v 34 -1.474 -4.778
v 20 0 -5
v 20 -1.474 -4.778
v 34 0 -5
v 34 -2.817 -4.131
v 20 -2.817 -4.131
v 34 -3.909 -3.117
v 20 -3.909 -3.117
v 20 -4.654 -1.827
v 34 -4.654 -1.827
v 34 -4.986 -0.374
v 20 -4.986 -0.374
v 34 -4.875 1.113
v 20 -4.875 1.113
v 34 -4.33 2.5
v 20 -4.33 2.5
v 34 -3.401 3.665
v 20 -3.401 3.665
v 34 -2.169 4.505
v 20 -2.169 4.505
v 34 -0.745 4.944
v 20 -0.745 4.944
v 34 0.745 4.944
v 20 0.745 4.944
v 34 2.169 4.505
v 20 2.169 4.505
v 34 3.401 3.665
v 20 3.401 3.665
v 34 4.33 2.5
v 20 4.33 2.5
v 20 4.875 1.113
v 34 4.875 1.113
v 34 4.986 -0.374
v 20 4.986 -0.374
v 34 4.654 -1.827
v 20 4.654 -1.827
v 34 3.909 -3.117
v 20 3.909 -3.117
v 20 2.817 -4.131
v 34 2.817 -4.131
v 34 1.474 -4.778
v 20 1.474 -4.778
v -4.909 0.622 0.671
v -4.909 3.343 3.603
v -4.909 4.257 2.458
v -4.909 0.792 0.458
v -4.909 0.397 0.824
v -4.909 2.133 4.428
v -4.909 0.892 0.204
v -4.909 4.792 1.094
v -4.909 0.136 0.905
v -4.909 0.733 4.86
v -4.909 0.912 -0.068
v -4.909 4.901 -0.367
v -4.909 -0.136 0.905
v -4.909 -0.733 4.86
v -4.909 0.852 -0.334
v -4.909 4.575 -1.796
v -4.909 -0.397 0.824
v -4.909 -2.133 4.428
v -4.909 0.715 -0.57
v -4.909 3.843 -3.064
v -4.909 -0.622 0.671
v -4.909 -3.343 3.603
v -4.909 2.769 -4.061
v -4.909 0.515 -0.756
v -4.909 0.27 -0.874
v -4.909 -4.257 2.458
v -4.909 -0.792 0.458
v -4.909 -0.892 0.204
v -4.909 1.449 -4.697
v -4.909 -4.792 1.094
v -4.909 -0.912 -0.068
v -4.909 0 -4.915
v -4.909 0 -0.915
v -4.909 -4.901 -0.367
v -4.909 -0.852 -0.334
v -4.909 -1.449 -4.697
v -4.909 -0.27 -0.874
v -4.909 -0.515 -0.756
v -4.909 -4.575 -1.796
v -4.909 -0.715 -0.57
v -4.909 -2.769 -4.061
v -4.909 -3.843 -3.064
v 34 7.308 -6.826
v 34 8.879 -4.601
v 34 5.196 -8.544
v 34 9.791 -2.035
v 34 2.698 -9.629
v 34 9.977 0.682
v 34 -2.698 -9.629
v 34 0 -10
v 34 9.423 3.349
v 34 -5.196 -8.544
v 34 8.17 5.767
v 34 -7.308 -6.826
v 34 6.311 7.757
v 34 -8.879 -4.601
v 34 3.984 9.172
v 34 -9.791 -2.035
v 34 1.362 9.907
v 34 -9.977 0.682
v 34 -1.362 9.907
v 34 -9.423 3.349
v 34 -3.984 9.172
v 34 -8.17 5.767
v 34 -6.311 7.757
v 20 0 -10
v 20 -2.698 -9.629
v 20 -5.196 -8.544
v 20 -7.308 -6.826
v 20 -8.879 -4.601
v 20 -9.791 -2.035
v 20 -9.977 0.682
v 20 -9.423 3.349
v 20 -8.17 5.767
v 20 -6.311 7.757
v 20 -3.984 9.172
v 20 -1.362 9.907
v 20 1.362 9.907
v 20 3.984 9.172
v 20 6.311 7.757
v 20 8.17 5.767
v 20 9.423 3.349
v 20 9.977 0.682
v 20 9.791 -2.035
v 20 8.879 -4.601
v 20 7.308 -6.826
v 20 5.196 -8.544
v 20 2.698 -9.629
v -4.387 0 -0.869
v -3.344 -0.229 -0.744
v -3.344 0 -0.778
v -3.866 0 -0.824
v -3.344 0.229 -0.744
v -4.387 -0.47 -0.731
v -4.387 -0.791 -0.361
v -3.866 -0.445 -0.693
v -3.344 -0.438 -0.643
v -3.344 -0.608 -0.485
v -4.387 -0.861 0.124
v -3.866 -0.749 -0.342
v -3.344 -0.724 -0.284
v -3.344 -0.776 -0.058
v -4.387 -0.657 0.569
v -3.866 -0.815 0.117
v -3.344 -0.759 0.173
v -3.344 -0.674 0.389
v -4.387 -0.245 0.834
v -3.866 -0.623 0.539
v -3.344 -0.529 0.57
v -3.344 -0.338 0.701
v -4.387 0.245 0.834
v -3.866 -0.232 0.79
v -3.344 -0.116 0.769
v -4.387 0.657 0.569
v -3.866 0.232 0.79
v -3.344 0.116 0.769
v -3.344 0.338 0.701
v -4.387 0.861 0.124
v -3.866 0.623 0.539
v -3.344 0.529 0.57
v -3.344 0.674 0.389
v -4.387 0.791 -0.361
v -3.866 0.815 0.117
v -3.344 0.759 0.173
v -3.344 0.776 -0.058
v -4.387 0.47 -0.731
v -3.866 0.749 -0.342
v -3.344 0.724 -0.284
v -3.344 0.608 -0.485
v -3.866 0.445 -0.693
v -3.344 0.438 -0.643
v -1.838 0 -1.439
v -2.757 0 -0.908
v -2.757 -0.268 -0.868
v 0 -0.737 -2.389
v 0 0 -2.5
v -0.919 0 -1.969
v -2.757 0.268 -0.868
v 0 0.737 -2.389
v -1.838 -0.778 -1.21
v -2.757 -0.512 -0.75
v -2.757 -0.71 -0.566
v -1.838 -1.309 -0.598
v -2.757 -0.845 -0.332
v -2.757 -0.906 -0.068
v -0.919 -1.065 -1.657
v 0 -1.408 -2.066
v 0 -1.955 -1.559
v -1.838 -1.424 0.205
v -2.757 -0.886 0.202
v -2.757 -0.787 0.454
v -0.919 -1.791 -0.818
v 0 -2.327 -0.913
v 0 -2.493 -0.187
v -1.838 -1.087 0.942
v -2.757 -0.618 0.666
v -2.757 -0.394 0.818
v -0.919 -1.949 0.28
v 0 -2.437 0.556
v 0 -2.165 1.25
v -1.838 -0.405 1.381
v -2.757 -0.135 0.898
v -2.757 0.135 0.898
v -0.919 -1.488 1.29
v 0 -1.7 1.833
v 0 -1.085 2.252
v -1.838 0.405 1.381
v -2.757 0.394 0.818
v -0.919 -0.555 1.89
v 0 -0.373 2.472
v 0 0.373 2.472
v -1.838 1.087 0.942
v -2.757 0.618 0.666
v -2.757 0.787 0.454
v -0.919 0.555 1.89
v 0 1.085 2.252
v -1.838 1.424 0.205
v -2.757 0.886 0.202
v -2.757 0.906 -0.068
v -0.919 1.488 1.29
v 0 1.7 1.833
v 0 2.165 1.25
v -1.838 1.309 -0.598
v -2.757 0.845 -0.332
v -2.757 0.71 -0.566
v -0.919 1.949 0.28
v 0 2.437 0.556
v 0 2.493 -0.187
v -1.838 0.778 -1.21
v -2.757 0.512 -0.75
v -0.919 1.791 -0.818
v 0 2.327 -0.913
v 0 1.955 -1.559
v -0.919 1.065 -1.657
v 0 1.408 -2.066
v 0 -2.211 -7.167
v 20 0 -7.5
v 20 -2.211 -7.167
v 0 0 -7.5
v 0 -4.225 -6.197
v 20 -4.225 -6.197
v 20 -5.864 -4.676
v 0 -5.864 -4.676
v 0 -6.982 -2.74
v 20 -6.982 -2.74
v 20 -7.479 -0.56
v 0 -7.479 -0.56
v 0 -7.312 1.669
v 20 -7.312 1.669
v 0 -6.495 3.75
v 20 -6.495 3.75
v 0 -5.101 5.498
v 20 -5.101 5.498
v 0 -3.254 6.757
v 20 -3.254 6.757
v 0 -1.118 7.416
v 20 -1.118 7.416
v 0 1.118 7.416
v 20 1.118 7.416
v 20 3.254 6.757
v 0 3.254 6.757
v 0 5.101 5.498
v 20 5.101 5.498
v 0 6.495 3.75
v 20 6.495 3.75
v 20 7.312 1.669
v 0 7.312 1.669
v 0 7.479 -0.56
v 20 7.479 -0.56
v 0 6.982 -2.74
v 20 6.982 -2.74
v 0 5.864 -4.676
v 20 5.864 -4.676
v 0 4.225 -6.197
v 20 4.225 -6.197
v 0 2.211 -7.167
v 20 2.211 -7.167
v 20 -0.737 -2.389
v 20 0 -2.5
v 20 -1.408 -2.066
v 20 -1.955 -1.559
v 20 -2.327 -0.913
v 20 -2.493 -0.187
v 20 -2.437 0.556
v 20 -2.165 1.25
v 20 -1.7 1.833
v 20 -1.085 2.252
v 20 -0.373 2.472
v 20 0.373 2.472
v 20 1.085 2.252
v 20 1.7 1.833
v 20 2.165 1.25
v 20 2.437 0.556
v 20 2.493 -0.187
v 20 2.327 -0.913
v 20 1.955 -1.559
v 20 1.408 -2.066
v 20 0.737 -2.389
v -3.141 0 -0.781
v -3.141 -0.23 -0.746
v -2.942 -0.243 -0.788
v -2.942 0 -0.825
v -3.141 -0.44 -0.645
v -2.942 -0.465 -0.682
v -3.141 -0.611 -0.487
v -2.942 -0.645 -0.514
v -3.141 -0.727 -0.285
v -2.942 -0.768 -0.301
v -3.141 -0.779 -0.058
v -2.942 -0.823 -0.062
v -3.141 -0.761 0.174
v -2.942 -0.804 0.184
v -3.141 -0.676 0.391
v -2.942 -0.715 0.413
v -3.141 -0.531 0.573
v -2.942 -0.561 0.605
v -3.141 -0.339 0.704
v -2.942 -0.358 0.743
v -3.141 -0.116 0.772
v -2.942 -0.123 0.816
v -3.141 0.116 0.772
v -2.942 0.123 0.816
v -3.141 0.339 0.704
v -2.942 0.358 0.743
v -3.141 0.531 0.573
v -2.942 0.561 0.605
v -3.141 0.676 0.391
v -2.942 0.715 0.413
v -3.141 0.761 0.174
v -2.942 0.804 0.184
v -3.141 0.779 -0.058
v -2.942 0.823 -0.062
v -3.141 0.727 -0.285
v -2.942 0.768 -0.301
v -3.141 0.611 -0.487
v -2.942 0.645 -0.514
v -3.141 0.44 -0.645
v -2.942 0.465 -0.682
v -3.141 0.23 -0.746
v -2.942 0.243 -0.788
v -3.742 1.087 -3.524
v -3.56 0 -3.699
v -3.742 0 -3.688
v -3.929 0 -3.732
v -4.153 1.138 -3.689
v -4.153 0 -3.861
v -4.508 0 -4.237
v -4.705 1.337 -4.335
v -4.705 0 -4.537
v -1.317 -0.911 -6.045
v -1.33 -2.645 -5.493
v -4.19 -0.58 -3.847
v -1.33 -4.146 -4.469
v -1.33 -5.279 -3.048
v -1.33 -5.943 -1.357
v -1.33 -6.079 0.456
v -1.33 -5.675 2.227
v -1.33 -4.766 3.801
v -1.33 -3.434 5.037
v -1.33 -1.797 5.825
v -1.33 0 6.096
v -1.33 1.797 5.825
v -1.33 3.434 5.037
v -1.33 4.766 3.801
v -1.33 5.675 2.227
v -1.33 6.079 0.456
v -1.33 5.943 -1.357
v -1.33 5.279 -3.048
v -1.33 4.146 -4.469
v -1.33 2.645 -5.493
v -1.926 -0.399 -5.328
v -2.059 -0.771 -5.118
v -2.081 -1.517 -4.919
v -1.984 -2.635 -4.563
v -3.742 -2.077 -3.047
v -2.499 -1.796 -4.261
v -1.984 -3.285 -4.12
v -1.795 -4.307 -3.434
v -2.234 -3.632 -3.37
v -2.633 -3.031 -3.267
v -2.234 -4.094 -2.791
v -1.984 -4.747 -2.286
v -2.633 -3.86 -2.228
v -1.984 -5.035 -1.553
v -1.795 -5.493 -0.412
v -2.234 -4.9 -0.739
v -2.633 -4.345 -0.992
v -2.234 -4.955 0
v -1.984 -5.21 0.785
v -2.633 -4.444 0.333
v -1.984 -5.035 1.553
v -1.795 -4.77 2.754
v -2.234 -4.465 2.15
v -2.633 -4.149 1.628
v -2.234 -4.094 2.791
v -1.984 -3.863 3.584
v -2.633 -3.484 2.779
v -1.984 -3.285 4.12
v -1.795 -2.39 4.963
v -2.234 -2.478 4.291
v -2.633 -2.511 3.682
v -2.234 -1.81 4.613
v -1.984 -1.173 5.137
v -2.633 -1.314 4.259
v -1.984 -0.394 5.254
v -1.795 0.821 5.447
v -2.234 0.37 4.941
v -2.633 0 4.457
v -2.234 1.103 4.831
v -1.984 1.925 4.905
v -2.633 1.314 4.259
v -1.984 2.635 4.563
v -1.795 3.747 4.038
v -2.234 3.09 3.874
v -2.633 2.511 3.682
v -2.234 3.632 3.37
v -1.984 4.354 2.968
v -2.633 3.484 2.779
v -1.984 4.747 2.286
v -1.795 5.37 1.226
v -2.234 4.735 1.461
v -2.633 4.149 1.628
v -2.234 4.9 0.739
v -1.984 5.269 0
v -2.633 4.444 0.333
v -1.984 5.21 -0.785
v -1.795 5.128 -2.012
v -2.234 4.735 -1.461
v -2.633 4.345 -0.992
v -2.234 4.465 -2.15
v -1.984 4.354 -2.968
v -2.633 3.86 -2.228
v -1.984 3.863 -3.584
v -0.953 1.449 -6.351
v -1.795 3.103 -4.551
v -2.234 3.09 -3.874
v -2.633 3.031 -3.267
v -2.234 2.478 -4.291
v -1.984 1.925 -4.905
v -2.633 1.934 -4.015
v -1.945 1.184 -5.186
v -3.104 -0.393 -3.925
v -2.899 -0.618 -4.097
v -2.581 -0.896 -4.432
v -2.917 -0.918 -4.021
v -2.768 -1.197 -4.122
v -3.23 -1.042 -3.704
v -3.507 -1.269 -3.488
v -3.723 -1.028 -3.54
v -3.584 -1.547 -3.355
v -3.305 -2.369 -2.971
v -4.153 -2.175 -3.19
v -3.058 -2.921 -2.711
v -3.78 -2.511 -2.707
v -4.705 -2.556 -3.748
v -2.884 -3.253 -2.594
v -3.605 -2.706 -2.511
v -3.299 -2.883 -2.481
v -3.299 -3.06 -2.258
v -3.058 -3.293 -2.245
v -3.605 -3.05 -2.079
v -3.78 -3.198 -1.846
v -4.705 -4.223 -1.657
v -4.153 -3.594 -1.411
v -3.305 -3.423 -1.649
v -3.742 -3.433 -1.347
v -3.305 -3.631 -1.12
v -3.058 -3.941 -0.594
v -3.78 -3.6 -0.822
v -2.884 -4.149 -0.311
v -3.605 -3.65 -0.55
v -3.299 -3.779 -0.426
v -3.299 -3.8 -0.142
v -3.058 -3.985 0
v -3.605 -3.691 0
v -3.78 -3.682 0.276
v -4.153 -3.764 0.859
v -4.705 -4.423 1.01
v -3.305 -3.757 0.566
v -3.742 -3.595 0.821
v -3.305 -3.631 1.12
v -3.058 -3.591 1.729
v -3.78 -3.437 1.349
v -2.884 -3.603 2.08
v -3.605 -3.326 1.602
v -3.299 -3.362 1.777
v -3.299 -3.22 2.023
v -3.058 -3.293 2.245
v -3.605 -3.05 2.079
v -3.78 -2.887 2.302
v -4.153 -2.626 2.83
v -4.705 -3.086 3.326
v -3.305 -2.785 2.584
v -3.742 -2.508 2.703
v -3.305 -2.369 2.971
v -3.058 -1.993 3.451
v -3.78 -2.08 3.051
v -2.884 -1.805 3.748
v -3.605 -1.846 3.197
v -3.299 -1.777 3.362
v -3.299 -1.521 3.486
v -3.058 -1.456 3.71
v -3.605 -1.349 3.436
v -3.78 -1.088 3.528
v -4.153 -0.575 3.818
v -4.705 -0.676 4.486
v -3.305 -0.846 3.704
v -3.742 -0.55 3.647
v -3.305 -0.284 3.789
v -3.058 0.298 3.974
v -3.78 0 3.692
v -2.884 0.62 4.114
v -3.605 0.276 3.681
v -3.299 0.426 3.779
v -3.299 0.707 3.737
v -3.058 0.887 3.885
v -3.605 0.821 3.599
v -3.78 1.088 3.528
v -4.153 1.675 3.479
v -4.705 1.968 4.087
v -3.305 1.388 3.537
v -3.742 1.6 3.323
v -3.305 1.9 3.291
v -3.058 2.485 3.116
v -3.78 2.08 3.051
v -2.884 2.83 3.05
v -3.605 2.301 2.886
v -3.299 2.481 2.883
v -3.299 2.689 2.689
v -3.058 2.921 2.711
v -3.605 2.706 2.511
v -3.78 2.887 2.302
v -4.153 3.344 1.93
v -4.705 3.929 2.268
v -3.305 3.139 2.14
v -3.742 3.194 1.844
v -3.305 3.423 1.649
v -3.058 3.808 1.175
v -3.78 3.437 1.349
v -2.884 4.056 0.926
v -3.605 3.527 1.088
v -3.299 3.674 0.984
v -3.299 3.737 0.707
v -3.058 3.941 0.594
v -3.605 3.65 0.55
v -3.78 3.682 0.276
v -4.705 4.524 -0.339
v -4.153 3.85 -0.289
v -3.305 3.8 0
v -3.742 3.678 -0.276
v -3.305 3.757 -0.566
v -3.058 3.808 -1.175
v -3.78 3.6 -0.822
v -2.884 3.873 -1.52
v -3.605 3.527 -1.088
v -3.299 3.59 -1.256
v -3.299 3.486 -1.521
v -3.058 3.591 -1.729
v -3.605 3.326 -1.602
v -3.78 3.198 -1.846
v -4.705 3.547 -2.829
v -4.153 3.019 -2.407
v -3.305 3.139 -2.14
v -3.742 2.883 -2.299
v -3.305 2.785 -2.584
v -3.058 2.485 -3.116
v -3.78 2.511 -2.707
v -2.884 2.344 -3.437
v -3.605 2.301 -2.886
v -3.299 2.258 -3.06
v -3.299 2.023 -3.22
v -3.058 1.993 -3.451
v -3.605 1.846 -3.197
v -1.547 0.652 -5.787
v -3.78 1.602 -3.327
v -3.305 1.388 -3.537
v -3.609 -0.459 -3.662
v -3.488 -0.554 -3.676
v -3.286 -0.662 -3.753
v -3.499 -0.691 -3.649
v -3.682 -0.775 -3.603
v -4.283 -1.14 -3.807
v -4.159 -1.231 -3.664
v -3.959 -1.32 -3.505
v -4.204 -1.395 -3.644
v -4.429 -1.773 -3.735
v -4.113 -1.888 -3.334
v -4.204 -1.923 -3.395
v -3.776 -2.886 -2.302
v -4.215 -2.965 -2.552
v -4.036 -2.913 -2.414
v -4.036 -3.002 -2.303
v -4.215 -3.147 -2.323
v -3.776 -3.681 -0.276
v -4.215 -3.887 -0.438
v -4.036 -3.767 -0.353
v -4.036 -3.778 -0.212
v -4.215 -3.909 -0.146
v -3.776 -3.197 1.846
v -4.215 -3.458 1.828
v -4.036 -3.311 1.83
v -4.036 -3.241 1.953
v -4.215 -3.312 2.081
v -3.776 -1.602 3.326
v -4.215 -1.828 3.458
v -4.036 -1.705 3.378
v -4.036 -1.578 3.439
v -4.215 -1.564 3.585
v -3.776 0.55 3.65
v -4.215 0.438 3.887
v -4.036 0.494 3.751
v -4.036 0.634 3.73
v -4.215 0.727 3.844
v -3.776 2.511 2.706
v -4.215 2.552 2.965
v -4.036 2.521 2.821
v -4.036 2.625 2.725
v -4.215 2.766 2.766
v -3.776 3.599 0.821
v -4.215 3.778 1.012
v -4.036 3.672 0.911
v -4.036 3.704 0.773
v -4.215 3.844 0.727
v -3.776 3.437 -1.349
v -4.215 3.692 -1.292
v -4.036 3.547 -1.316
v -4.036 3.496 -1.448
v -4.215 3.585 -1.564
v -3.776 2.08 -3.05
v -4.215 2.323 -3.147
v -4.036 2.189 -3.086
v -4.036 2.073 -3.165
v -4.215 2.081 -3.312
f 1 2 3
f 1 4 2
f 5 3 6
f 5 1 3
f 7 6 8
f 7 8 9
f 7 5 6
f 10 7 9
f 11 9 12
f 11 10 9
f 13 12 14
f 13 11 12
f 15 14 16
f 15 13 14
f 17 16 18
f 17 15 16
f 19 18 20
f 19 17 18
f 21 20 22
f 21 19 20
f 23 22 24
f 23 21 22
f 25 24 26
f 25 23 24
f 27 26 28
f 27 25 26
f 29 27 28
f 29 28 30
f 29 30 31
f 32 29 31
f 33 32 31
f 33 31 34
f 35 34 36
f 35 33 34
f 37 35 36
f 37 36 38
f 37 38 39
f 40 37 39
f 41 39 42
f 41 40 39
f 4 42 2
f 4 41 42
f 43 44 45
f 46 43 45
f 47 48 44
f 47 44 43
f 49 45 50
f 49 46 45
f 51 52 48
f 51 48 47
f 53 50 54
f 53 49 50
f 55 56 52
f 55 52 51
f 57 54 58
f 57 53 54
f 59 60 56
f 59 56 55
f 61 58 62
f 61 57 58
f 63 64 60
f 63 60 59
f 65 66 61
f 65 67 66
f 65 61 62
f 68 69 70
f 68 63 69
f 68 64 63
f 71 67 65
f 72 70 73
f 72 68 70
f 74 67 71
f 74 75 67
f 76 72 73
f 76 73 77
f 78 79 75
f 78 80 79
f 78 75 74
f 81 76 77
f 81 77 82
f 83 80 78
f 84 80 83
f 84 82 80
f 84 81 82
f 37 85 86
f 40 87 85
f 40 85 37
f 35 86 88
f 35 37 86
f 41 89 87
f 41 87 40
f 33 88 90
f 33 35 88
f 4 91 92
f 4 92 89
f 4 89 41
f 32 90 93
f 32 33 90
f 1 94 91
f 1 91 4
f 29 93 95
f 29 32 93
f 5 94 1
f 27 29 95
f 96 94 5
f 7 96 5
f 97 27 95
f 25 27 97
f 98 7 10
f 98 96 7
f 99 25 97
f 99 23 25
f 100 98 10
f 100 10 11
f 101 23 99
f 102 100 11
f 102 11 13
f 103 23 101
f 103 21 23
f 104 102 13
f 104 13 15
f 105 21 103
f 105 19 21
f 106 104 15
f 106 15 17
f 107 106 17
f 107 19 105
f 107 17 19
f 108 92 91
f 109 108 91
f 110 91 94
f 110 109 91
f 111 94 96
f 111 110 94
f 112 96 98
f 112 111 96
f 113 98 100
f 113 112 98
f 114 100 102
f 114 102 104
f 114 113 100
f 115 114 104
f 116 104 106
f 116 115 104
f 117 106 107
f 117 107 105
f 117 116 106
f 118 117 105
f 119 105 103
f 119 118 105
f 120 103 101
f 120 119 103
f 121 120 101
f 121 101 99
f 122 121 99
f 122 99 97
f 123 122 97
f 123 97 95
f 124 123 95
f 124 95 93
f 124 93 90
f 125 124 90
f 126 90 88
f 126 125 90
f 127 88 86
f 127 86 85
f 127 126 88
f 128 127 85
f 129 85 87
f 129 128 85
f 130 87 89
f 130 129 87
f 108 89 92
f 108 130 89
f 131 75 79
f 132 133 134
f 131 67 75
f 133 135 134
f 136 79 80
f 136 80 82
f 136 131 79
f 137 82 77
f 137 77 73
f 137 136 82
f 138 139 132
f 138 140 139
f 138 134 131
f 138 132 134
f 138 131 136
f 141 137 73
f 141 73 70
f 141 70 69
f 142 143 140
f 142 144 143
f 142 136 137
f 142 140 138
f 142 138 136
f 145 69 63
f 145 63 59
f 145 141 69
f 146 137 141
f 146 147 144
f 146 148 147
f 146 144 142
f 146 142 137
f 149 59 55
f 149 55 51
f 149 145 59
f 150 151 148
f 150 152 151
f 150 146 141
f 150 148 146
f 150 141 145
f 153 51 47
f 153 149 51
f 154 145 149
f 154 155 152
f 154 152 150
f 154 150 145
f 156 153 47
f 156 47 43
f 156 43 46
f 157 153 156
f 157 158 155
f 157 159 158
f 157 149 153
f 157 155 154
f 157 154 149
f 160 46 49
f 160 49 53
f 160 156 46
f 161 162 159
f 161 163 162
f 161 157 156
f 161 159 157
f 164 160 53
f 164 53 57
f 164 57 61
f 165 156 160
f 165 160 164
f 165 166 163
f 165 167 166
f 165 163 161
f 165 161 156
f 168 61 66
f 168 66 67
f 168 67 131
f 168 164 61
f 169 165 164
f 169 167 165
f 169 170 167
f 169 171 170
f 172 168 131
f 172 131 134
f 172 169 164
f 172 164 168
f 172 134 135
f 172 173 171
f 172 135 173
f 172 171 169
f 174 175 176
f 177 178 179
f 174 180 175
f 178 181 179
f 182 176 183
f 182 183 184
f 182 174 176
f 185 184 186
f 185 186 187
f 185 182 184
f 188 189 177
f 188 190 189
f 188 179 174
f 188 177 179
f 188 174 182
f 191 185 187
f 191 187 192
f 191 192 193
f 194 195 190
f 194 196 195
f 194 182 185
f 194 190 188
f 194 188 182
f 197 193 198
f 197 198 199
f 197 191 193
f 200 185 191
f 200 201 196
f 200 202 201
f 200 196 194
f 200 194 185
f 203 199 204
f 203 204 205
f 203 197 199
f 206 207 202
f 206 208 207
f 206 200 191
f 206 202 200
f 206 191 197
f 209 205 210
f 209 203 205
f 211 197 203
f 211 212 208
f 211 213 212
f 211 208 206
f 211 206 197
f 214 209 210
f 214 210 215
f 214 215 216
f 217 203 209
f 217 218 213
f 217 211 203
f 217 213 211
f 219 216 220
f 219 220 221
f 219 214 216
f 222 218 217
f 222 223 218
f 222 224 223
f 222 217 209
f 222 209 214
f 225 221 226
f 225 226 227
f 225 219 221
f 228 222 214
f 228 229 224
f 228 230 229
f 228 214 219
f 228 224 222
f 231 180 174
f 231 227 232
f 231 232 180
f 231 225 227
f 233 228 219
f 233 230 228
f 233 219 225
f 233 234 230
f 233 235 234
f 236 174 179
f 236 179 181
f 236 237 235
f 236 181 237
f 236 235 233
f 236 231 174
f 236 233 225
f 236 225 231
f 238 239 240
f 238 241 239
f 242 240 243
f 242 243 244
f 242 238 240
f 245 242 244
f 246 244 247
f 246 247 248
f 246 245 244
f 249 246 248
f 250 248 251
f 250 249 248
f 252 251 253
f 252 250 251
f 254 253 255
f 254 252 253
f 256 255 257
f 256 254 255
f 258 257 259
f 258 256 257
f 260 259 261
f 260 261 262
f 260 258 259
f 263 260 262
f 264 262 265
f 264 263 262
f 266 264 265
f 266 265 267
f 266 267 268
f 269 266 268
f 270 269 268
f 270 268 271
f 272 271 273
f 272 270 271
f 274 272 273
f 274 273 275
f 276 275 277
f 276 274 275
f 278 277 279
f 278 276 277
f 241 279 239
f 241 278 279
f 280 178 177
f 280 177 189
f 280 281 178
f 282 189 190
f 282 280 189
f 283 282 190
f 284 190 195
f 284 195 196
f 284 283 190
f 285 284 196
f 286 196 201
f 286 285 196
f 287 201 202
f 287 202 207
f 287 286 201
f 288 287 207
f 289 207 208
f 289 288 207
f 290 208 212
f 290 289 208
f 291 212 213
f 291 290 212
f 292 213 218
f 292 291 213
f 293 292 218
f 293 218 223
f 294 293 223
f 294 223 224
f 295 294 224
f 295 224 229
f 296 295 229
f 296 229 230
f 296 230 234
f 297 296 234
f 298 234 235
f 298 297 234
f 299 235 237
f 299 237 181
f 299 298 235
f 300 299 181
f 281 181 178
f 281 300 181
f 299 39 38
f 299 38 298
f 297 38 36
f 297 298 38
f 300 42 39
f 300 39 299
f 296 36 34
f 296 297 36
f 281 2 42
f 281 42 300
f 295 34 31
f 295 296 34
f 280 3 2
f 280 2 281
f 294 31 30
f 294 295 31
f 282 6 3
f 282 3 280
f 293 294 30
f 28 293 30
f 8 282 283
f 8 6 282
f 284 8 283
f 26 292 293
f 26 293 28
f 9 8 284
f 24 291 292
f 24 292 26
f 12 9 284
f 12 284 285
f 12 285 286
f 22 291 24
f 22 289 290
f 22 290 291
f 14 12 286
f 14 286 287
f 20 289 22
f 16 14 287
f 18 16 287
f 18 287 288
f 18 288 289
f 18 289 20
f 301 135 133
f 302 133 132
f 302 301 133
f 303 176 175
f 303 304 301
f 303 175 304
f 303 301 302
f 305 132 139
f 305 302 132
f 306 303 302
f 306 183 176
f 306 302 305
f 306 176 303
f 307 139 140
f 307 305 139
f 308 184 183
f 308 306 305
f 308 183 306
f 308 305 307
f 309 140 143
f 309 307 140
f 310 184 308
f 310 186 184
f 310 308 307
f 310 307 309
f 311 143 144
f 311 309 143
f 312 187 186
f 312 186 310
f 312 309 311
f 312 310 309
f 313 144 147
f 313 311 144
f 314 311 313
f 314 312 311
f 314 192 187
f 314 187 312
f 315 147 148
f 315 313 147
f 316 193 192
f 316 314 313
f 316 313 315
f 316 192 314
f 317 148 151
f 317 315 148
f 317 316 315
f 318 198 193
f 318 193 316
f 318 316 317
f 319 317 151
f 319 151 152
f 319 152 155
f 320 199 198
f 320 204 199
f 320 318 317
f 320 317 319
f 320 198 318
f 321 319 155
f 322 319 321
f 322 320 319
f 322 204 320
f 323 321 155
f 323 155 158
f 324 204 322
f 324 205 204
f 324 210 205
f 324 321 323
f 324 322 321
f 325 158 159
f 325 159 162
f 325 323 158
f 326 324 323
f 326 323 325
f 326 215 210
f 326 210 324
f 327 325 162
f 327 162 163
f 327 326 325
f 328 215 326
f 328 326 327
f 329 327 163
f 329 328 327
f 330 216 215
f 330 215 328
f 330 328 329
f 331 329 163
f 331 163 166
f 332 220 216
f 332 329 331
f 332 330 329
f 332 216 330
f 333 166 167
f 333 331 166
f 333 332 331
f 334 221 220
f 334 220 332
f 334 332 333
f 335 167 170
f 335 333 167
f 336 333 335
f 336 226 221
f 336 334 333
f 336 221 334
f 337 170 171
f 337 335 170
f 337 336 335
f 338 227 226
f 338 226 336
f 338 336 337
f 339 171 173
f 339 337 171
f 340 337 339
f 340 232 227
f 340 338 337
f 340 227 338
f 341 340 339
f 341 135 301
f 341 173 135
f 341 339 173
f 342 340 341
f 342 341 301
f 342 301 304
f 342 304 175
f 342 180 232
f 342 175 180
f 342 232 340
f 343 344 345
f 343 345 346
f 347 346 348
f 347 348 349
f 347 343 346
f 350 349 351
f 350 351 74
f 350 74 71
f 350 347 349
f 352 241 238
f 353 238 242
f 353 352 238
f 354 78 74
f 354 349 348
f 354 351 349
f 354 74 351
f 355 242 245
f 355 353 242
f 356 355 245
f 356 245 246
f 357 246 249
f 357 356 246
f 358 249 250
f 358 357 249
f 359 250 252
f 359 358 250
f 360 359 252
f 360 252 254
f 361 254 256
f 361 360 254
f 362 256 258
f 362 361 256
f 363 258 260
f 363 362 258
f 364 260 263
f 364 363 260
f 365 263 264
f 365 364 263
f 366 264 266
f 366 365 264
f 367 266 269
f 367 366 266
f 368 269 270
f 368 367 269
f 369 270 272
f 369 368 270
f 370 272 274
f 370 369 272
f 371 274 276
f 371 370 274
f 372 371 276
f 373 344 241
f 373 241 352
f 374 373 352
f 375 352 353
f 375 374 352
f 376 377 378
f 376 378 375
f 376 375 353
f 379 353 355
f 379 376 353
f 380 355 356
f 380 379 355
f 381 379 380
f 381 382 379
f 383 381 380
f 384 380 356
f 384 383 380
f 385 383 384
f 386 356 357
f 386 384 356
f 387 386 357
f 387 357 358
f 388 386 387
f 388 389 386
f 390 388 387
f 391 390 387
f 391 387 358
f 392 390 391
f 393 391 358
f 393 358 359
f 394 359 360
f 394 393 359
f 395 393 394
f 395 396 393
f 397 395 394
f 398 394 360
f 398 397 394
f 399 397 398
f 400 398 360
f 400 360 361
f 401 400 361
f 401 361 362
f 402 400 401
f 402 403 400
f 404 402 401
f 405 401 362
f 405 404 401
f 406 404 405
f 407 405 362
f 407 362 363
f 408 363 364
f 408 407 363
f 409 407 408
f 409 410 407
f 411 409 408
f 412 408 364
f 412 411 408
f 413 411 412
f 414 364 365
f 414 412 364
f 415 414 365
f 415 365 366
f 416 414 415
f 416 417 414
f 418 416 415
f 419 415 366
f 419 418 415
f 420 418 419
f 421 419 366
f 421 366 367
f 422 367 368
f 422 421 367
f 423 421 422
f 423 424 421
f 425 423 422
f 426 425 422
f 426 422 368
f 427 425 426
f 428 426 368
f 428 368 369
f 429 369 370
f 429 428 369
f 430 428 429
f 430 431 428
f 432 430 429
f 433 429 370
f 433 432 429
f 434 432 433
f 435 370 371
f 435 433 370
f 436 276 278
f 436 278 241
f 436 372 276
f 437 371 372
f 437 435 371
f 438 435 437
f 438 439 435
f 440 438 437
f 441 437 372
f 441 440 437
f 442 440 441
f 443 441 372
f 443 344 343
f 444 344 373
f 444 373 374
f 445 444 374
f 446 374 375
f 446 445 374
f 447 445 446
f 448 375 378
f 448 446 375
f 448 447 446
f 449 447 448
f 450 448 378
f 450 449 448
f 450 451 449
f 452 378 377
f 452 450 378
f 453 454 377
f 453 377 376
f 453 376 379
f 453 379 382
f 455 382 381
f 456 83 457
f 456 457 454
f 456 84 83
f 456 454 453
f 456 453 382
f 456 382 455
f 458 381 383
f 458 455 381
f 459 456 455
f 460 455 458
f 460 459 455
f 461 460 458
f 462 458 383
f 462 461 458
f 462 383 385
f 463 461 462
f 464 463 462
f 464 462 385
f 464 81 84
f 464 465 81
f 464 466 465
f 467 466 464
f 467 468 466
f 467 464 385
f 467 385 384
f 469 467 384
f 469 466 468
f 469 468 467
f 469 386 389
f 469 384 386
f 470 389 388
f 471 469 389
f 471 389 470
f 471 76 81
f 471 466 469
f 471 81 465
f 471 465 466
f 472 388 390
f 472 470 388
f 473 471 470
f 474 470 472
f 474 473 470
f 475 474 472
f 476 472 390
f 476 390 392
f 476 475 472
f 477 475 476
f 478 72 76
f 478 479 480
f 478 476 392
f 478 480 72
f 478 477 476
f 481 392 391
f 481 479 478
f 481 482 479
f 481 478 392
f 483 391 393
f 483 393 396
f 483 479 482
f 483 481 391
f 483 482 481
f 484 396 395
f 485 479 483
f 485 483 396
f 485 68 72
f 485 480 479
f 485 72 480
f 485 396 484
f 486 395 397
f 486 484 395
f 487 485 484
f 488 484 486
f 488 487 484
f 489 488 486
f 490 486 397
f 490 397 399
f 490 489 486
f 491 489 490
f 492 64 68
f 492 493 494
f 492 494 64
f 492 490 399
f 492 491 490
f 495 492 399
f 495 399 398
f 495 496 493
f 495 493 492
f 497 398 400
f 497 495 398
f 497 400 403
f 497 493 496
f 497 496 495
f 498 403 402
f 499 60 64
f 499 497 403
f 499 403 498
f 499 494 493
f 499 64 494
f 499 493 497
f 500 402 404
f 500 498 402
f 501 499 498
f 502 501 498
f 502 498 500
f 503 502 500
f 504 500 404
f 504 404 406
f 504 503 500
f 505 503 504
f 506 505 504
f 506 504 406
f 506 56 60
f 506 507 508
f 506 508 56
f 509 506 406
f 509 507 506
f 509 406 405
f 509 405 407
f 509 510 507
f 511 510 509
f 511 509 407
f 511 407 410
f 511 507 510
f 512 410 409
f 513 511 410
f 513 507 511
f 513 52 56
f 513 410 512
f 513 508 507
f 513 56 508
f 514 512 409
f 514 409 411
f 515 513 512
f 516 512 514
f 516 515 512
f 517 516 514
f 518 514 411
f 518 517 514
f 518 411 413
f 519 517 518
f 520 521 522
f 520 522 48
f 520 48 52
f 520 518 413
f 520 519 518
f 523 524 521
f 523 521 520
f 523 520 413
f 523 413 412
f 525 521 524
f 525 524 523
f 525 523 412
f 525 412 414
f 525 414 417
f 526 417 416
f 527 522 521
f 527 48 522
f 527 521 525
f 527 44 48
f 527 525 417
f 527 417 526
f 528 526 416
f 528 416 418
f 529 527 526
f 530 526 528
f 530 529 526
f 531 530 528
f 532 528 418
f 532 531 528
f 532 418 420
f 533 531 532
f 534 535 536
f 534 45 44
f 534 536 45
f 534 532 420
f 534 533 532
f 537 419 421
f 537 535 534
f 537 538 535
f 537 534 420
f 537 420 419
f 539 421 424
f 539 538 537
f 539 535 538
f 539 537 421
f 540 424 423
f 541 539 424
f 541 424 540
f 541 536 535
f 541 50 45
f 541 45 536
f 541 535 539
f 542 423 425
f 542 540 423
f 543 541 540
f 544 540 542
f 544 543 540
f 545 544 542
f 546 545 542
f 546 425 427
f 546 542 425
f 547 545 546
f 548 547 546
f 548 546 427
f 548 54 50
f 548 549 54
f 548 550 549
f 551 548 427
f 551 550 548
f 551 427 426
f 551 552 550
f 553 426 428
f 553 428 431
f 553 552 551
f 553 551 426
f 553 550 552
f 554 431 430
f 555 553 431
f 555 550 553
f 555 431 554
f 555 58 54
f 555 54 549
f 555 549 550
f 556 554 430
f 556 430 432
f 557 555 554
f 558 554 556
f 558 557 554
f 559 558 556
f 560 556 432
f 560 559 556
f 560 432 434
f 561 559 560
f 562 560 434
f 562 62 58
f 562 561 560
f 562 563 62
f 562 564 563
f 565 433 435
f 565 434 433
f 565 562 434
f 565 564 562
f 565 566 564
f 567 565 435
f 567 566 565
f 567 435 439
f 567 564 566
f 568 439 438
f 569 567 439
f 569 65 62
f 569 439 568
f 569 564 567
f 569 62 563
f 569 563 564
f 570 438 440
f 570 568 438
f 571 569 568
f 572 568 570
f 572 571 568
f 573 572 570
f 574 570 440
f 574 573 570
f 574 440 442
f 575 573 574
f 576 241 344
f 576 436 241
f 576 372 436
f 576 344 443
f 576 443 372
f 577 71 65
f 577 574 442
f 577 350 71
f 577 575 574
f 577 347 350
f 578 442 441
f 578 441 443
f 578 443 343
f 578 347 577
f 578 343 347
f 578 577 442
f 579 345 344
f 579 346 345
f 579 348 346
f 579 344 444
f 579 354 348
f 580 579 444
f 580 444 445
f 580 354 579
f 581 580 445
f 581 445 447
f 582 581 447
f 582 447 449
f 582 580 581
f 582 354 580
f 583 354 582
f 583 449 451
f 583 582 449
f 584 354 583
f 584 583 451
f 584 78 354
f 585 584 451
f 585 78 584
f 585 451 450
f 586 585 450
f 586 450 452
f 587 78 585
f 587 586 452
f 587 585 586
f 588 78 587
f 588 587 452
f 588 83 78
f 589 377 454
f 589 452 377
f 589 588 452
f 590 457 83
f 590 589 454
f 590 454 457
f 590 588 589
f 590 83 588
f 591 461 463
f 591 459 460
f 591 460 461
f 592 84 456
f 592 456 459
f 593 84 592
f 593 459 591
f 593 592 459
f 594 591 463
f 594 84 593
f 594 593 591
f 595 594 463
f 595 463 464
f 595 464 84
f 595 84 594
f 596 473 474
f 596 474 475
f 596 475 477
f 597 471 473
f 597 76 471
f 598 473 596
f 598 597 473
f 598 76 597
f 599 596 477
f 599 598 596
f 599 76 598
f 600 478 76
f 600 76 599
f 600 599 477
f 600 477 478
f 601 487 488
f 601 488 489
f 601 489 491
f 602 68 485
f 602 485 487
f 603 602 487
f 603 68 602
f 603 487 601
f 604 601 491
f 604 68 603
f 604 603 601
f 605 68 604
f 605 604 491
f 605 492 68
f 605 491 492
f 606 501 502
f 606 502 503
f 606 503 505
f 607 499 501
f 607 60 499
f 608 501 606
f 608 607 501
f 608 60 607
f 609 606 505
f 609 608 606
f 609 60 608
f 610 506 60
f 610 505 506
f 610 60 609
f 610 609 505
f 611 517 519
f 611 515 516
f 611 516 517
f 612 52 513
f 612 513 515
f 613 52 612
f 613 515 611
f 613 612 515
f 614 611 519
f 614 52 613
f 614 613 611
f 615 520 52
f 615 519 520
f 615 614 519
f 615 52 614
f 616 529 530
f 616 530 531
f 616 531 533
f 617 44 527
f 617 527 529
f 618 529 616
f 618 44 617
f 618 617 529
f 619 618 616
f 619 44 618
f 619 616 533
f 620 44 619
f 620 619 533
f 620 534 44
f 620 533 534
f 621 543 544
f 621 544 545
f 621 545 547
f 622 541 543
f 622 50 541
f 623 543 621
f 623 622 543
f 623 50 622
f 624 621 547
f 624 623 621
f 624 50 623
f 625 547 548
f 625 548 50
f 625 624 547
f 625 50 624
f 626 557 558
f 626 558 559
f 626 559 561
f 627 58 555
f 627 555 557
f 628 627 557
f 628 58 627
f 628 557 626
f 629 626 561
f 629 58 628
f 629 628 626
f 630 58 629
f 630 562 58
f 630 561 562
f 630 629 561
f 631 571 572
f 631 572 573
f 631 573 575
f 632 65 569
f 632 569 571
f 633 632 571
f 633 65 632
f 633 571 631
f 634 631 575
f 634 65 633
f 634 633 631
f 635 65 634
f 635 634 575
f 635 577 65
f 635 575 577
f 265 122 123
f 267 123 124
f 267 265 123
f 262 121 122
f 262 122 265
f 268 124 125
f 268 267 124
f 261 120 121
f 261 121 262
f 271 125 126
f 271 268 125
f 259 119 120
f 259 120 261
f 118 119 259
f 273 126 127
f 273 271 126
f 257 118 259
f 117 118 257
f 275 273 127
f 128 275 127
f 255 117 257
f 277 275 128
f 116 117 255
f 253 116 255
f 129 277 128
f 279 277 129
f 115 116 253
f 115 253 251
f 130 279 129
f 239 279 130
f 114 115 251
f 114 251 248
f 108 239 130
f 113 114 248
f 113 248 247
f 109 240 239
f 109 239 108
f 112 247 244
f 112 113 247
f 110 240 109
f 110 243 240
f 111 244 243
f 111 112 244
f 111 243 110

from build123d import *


with BuildPart() as part:
    # Sketch3 → Revolve1 (revolve)
    with BuildSketch(Plane(origin=(0, 0, 0), x_dir=(-1, 0, 0), z_dir=(0, 1, 0)), mode=Mode.PRIVATE) as revolve1_sk:
        with BuildLine():
            add(Edge.make_bspline(
                [(0, 7.5), (1.752854474, 5.664815439), (0.373820614, 7.240332376), (3.905572002, 2.879951334), (4.908772735, 4.915)],
                knots=[0, 0, 0, 0, 0.780983401, 1, 1, 1, 1], degree=3))
            Line((4.908772735, 4.915), (4.908772735, 0.915))
            Line((4.908772735, 0.915), (3.344098982, 0.778108784))
            ThreePointArc((3.344098982, 0.778108784), (3.040503625, 0.798007475), (2.756943239, 0.908278079))
            Line((2.756943239, 0.908278079), (0, 2.5))
            Line((0, 2.5), (-20, 2.5))
            Line((-20, 2.5), (-20, 5))
            Line((-20, 5), (-20, 7.5))
            Line((-20, 7.5), (0, 7.5))
        make_face()
        Polygon((-20, 10), (-20, 7.5), (-20, 5), (-34, 5), (-34, 10), align=None)
    revolve(revolve1_sk.sketch.rotate(Axis((0, 0, 0), (-1, 0, 0)), 180), axis=Axis((0, 0, 0), (-1, 0, 0)))


solid = part.part
